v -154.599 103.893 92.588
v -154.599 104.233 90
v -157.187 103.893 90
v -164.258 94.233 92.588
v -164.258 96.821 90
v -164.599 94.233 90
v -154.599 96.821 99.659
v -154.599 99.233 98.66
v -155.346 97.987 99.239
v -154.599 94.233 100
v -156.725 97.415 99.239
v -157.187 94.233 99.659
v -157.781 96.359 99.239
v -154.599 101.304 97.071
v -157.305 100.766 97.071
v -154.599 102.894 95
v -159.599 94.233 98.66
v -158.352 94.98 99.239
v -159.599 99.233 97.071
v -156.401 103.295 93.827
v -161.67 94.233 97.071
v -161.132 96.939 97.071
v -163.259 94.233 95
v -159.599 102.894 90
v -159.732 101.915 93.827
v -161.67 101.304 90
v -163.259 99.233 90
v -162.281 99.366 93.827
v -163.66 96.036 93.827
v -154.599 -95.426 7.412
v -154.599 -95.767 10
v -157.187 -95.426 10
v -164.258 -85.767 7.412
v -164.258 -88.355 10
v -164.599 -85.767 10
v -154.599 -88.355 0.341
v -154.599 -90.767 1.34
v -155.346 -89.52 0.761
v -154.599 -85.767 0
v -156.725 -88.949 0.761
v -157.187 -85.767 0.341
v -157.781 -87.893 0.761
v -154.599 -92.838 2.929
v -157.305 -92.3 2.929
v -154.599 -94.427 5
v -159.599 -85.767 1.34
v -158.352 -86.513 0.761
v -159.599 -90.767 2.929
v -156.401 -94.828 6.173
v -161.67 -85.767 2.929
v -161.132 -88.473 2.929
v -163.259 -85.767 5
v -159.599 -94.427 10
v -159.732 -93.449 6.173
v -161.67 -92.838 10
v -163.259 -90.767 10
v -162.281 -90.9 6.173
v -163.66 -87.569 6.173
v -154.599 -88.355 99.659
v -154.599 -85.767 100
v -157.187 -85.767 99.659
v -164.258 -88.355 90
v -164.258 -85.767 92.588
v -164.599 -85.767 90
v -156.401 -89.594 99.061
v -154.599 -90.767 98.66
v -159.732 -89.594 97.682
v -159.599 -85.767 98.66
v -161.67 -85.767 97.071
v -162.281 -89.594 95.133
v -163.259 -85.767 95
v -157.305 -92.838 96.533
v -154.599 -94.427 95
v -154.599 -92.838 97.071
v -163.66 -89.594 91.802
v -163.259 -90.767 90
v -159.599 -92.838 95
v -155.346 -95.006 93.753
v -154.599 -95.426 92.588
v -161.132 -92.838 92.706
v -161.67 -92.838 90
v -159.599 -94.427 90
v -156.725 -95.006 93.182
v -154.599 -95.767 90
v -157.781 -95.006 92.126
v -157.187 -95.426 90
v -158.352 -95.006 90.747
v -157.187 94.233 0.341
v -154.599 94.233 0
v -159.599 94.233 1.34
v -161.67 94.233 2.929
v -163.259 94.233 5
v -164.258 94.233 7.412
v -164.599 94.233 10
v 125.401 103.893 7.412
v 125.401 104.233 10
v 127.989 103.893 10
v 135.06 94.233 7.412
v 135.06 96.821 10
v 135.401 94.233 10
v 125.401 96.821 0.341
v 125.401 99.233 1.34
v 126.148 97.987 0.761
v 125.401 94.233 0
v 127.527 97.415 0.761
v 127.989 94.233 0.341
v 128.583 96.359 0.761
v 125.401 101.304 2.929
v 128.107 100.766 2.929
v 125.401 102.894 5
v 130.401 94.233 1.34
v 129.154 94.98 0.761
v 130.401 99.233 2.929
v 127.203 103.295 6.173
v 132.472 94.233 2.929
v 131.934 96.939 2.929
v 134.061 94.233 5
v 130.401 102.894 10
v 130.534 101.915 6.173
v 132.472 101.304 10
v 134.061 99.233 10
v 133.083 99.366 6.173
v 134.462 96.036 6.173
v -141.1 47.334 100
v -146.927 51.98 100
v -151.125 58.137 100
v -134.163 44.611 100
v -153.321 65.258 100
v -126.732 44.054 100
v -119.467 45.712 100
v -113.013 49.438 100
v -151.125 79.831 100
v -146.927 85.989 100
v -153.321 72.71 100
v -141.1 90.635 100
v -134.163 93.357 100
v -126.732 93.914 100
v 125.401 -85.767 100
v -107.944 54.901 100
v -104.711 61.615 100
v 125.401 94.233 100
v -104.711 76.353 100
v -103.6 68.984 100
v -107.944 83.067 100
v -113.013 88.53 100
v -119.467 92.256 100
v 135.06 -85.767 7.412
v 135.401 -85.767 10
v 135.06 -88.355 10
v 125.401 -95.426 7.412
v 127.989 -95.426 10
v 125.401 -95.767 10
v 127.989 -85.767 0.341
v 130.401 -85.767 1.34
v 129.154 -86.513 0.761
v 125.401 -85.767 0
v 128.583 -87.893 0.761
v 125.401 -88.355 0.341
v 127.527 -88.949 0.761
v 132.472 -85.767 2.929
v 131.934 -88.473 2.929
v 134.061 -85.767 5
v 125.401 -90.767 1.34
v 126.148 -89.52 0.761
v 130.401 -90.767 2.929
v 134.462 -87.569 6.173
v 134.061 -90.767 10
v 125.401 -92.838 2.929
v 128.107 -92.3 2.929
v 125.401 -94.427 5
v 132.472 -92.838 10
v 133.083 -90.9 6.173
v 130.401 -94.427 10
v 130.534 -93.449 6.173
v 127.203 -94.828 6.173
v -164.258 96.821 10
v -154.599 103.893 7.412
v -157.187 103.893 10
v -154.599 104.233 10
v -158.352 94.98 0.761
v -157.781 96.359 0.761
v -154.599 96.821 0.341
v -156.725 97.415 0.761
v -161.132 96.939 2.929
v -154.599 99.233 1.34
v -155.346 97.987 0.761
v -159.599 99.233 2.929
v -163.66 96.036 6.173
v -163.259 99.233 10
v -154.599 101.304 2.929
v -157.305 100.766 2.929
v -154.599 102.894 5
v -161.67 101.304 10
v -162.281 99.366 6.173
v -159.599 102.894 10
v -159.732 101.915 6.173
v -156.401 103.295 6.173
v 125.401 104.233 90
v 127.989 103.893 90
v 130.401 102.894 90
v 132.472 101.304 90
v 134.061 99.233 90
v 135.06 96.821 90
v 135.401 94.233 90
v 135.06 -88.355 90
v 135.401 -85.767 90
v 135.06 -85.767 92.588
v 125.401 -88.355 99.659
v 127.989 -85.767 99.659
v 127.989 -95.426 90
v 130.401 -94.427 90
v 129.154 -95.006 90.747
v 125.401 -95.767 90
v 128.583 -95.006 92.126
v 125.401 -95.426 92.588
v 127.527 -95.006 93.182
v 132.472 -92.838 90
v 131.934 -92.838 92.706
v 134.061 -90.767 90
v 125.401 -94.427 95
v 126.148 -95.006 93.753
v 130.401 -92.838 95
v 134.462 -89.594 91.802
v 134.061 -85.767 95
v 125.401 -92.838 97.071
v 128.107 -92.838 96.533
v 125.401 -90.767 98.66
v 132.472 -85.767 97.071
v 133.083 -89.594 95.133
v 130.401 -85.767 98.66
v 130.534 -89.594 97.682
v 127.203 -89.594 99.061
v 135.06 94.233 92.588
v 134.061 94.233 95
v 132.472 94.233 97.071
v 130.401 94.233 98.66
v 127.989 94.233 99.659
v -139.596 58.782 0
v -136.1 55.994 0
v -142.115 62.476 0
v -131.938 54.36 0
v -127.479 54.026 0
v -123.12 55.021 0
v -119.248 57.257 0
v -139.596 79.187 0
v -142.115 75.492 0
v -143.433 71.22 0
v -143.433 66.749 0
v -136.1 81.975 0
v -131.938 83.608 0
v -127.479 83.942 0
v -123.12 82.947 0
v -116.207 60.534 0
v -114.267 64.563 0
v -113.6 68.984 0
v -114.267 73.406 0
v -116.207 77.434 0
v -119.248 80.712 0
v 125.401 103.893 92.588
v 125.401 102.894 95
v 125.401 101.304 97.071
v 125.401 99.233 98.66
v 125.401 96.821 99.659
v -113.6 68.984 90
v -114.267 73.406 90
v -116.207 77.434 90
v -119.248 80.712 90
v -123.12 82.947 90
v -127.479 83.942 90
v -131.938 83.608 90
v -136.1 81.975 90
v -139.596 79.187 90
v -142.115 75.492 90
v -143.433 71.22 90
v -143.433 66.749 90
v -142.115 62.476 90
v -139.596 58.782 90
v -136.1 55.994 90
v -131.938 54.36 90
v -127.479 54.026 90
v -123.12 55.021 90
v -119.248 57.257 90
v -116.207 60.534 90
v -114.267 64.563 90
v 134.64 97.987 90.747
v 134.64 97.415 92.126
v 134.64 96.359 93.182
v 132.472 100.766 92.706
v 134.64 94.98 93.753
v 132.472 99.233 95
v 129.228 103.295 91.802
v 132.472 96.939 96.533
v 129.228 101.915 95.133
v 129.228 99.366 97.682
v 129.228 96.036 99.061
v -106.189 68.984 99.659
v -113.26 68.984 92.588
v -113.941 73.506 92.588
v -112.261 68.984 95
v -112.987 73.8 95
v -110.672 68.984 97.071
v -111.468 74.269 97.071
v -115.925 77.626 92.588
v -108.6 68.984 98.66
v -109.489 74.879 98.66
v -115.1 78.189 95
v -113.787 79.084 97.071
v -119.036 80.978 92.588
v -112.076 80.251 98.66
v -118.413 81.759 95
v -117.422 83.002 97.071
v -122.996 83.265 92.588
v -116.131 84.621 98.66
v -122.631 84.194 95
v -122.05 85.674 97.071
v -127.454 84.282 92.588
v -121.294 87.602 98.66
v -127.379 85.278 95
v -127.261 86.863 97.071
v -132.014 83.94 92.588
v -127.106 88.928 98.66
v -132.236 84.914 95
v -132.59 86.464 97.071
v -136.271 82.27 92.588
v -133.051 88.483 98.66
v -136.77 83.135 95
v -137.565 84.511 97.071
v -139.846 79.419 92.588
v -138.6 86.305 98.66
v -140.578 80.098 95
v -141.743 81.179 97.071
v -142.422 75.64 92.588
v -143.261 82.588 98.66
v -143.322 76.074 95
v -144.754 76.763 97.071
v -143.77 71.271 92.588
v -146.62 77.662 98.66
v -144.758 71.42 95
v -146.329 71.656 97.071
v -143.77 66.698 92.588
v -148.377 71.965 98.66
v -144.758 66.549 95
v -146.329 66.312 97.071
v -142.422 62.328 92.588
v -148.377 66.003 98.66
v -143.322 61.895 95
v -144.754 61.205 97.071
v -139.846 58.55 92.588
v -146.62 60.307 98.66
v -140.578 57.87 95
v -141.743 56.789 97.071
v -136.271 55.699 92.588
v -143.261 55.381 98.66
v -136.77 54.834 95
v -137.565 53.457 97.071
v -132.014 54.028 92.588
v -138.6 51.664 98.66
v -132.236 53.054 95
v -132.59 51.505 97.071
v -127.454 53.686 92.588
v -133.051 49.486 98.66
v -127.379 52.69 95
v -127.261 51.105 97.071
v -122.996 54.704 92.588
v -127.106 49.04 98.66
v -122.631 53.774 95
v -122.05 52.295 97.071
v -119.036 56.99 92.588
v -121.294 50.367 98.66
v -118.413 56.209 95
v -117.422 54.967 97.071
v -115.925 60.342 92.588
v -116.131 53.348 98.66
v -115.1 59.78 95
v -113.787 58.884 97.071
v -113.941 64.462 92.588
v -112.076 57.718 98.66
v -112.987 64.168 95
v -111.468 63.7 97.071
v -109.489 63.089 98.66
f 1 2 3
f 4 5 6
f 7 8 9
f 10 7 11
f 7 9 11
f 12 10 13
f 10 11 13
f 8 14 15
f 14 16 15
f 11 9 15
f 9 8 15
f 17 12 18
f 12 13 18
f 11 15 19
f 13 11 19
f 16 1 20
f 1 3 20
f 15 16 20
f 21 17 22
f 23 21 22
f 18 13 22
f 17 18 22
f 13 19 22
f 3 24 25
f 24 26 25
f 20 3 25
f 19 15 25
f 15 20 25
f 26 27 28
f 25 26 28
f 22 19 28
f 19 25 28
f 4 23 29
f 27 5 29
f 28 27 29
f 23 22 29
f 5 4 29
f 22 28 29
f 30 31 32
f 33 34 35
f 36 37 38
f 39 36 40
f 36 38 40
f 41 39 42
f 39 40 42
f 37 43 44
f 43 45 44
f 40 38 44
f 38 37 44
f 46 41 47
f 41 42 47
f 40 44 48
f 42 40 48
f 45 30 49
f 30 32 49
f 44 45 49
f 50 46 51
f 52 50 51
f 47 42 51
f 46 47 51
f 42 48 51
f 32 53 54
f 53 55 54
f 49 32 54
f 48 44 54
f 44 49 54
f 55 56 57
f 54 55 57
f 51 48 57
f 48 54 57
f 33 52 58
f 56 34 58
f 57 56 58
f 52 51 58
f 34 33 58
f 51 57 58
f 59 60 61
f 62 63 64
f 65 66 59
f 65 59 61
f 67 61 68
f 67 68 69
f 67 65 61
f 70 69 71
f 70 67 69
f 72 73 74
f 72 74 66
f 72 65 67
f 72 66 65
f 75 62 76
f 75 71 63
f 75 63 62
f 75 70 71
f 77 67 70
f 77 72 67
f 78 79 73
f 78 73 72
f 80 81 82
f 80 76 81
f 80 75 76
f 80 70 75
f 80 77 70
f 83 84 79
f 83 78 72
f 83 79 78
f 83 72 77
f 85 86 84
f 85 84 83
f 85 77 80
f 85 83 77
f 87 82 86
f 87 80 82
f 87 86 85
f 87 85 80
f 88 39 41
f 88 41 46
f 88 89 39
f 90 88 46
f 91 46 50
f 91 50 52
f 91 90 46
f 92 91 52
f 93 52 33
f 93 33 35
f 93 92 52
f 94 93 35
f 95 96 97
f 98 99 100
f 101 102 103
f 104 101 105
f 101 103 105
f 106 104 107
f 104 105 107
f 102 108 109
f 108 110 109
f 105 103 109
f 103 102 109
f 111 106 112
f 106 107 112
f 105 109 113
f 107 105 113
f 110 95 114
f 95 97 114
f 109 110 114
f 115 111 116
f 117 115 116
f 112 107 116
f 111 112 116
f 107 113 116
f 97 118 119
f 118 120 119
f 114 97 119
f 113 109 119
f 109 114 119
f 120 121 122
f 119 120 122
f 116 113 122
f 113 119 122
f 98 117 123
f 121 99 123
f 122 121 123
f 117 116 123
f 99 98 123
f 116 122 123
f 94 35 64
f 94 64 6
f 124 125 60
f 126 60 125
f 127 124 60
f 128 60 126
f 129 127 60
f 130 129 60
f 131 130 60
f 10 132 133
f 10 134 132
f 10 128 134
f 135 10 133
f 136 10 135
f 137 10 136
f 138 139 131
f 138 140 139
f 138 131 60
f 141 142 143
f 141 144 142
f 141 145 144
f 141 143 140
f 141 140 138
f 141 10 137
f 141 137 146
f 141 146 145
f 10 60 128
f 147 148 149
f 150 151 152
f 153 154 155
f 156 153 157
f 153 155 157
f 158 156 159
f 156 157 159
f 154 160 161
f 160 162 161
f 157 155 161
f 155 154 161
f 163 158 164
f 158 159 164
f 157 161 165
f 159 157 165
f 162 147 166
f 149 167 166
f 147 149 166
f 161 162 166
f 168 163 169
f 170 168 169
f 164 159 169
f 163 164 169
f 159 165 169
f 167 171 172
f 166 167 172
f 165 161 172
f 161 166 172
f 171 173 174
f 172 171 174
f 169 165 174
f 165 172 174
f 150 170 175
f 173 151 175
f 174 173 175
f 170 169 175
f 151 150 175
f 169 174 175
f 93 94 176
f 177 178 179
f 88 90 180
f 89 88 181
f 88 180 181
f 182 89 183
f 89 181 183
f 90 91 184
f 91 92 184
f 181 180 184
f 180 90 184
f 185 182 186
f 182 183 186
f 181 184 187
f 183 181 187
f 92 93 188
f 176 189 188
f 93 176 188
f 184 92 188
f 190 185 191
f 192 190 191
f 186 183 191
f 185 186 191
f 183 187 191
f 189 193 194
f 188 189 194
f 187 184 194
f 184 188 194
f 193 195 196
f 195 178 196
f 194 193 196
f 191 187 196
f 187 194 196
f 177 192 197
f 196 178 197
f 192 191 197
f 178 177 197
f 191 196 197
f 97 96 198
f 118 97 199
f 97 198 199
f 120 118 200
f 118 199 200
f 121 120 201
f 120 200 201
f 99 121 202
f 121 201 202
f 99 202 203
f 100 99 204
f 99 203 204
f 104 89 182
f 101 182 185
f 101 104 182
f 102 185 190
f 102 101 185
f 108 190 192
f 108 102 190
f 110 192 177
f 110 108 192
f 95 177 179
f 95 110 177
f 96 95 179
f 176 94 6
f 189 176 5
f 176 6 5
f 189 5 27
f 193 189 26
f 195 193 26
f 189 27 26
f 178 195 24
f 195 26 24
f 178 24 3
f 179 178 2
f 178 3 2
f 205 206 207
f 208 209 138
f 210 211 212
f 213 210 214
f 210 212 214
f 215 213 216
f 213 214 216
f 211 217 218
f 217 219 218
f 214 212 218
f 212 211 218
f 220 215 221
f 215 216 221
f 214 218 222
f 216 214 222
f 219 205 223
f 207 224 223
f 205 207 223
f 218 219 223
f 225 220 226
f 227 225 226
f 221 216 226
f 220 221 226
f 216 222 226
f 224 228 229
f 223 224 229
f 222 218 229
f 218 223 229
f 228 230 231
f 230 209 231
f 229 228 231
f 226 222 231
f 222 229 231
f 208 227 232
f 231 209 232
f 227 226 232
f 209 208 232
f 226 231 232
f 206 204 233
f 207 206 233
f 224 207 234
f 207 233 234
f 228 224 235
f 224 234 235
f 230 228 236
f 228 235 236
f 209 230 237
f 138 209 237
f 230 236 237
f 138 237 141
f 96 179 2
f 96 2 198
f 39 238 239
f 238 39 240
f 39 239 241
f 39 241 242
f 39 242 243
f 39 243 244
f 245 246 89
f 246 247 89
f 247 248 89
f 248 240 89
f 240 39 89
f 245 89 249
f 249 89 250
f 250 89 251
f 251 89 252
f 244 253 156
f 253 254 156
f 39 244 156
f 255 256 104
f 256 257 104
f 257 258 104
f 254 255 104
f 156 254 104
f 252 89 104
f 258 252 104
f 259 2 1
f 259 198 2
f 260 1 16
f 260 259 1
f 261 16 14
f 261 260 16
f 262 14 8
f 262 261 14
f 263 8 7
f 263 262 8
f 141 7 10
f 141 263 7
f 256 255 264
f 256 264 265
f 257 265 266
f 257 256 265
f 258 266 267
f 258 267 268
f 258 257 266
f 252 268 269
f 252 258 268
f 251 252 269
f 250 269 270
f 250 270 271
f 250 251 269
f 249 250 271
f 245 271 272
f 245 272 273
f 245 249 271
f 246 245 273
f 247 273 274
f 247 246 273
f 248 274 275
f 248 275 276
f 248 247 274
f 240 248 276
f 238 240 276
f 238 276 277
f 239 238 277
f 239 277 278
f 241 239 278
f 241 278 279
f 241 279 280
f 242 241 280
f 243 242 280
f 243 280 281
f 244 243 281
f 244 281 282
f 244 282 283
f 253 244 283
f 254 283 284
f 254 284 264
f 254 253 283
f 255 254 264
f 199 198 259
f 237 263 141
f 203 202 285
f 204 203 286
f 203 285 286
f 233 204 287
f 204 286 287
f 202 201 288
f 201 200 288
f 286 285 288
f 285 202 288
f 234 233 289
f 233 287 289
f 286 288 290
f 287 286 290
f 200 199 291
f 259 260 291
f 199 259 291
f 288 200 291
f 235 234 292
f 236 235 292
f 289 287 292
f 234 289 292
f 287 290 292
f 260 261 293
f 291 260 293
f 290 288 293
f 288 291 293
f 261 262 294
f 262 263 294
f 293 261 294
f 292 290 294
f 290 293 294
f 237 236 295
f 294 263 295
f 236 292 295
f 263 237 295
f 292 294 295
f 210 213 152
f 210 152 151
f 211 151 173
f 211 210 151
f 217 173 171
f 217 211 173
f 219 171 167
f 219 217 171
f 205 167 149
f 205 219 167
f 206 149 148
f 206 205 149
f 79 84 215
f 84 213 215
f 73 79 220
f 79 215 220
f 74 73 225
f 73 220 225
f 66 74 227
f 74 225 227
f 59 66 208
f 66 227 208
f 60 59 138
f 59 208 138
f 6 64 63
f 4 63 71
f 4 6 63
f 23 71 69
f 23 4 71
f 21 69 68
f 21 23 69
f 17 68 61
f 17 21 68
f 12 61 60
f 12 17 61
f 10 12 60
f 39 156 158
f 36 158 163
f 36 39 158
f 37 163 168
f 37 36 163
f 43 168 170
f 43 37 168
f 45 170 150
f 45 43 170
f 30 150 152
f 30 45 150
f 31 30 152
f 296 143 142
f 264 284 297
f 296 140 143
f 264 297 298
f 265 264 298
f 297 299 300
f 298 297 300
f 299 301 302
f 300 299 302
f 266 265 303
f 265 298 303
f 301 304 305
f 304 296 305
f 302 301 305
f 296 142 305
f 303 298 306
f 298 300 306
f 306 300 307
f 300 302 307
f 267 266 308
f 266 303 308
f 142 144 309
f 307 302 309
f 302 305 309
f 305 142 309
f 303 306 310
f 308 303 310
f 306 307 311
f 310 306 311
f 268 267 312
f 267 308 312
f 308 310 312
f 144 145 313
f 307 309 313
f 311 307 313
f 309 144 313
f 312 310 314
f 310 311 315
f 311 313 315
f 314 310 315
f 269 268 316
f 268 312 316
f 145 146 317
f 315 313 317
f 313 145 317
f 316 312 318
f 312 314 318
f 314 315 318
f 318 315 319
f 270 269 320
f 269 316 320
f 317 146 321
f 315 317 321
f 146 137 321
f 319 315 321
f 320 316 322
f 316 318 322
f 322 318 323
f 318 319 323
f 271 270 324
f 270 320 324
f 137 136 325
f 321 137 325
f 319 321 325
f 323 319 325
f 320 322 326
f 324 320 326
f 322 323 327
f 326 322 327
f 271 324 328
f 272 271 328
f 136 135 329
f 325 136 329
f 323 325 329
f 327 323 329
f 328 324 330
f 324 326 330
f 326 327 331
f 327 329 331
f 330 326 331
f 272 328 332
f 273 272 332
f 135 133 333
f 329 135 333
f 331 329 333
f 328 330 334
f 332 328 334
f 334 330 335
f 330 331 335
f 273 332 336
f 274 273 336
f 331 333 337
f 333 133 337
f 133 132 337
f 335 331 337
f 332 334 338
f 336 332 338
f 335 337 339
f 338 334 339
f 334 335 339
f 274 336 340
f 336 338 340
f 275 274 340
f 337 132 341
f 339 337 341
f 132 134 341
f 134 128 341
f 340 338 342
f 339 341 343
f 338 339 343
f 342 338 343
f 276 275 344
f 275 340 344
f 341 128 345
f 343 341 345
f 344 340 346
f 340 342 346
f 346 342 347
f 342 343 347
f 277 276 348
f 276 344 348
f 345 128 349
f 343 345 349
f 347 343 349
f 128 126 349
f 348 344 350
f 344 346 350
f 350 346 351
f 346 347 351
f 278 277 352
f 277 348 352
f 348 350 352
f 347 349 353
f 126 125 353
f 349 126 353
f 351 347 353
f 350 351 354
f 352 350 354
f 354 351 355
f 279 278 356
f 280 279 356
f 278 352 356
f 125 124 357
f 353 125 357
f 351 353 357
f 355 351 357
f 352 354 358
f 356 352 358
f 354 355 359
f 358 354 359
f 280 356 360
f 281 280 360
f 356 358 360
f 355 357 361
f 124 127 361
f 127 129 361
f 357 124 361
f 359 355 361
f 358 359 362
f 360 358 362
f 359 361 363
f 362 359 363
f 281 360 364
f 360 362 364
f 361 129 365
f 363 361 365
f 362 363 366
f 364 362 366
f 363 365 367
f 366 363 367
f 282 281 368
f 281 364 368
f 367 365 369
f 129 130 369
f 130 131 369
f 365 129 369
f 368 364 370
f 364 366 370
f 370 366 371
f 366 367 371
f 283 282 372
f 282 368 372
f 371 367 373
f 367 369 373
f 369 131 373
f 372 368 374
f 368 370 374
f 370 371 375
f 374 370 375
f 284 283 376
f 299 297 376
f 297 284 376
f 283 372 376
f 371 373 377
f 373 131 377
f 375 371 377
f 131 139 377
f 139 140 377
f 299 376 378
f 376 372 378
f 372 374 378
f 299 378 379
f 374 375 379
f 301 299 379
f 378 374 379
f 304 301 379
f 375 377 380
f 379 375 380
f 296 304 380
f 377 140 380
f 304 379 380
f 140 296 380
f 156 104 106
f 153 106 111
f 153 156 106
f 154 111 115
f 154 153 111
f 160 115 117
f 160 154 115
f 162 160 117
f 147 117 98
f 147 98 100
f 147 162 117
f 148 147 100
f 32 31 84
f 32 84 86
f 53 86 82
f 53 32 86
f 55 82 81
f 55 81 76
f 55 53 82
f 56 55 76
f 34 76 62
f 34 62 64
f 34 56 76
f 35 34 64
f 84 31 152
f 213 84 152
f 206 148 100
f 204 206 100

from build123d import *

# Parameters (mm, degrees)
F0_W        = 300
F0_H        = 200
F0_R        = 15
F1_DEPTH    = 100
F2_R        = 10
F3_T1_DEPTH = 115
F3_S5_W     = 10
F3_S5_H     = 10
F3_T6_DEPTH = 10
F4_R        = 10


# Not quite as in the source:
# - a fillet or chamfer that OpenCascade refuses, or shapes differently, is made with other operations: its cross-section is extruded or revolved along the edge and cut away or added


with BuildPart() as f1:
    # F0 (on Top) → F1 (new body)
    with BuildSketch(Plane.XY):
        with Locations((-14.5989330485, 4.2332556737)):
            Rectangle(F0_W, F0_H)
        with Locations((-128.6004347833, 68.9842231594)):
            Circle(F0_R, mode=Mode.SUBTRACT)
    extrude(amount=F1_DEPTH)

    # F2
    f2_edges = [f1.edges().sort_by_distance(p)[0] for p in [
        (-164.598933, 104.233256, 50),
        (-14.598933, 104.233256, 100),
        (135.401067, 104.233256, 50),
        (135.401067, 4.233256, 100),
        (-164.598933, 4.233256, 100),
        (-143.600435, 68.984223, 100),
        (135.401067, -95.766744, 50),
        (-14.598933, -95.766744, 100),
    ]]
    fillet(f2_edges, radius=F2_R)

    # F3: fillet of radius 10 on 3 edges, made by hand

    # F3_s2 → F3_t1 (cut)
    with BuildSketch(Plane.XY.offset(-25)):
        with BuildLine():
            ThreePointArc((-154.5989330485, -95.7667443263), (-161.6700008604, -92.8378121382), (-164.5989330485, -85.7667443263))
            Line((-164.5989330485, -85.7667443263), (-164.5989330485, -95.7667443263))
            Line((-164.5989330485, -95.7667443263), (-154.5989330485, -95.7667443263))
        make_face()
    extrude(amount=F3_T1_DEPTH, mode=Mode.SUBTRACT)


with BuildPart() as f3_tool4:
    # F3_s5 → F3_t6 (new body)
    with BuildSketch(Plane.XZ.offset(85.7667443263)):
        with Locations((-159.5989330485, 95)):
            Rectangle(F3_S5_W, F3_S5_H)
    extrude(amount=F3_T6_DEPTH)

    # F3_s7 → F3_t8 (revolve, cut)
    with BuildSketch(Plane(origin=(-154.5989330485, -85.7667443263, 90), x_dir=(0.7071067812, 0, -0.7071067812), z_dir=(-0.7071067812, 0, -0.7071067812))):
        with BuildLine():
            ThreePointArc((0, -10), (10, 0), (0, 10))
            Line((0, 10), (0, -10))
        make_face()
    revolve(axis=Axis((-154.5989330485, -85.7667443263, 90), (0, -1, 0)), mode=Mode.SUBTRACT)


with BuildPart() as f1_1:
    add(f1.part)

    # F3_t3: cut F3_tool4
    add(f3_tool4.part, mode=Mode.SUBTRACT)

    # F4
    f4_edges = [f1_1.edges().sort_by_distance(p)[0] for p in [
        (125.401067, 104.233256, 45),
        (135.401067, 94.233256, 45),
        (-154.598933, 104.233256, 45),
        (-161.670001, 101.304323, 0),
        (-164.598933, 94.233256, 45),
        (-161.670001, 101.304323, 90),
    ]]
    fillet(f4_edges, radius=F4_R)


solid = f1_1.part
